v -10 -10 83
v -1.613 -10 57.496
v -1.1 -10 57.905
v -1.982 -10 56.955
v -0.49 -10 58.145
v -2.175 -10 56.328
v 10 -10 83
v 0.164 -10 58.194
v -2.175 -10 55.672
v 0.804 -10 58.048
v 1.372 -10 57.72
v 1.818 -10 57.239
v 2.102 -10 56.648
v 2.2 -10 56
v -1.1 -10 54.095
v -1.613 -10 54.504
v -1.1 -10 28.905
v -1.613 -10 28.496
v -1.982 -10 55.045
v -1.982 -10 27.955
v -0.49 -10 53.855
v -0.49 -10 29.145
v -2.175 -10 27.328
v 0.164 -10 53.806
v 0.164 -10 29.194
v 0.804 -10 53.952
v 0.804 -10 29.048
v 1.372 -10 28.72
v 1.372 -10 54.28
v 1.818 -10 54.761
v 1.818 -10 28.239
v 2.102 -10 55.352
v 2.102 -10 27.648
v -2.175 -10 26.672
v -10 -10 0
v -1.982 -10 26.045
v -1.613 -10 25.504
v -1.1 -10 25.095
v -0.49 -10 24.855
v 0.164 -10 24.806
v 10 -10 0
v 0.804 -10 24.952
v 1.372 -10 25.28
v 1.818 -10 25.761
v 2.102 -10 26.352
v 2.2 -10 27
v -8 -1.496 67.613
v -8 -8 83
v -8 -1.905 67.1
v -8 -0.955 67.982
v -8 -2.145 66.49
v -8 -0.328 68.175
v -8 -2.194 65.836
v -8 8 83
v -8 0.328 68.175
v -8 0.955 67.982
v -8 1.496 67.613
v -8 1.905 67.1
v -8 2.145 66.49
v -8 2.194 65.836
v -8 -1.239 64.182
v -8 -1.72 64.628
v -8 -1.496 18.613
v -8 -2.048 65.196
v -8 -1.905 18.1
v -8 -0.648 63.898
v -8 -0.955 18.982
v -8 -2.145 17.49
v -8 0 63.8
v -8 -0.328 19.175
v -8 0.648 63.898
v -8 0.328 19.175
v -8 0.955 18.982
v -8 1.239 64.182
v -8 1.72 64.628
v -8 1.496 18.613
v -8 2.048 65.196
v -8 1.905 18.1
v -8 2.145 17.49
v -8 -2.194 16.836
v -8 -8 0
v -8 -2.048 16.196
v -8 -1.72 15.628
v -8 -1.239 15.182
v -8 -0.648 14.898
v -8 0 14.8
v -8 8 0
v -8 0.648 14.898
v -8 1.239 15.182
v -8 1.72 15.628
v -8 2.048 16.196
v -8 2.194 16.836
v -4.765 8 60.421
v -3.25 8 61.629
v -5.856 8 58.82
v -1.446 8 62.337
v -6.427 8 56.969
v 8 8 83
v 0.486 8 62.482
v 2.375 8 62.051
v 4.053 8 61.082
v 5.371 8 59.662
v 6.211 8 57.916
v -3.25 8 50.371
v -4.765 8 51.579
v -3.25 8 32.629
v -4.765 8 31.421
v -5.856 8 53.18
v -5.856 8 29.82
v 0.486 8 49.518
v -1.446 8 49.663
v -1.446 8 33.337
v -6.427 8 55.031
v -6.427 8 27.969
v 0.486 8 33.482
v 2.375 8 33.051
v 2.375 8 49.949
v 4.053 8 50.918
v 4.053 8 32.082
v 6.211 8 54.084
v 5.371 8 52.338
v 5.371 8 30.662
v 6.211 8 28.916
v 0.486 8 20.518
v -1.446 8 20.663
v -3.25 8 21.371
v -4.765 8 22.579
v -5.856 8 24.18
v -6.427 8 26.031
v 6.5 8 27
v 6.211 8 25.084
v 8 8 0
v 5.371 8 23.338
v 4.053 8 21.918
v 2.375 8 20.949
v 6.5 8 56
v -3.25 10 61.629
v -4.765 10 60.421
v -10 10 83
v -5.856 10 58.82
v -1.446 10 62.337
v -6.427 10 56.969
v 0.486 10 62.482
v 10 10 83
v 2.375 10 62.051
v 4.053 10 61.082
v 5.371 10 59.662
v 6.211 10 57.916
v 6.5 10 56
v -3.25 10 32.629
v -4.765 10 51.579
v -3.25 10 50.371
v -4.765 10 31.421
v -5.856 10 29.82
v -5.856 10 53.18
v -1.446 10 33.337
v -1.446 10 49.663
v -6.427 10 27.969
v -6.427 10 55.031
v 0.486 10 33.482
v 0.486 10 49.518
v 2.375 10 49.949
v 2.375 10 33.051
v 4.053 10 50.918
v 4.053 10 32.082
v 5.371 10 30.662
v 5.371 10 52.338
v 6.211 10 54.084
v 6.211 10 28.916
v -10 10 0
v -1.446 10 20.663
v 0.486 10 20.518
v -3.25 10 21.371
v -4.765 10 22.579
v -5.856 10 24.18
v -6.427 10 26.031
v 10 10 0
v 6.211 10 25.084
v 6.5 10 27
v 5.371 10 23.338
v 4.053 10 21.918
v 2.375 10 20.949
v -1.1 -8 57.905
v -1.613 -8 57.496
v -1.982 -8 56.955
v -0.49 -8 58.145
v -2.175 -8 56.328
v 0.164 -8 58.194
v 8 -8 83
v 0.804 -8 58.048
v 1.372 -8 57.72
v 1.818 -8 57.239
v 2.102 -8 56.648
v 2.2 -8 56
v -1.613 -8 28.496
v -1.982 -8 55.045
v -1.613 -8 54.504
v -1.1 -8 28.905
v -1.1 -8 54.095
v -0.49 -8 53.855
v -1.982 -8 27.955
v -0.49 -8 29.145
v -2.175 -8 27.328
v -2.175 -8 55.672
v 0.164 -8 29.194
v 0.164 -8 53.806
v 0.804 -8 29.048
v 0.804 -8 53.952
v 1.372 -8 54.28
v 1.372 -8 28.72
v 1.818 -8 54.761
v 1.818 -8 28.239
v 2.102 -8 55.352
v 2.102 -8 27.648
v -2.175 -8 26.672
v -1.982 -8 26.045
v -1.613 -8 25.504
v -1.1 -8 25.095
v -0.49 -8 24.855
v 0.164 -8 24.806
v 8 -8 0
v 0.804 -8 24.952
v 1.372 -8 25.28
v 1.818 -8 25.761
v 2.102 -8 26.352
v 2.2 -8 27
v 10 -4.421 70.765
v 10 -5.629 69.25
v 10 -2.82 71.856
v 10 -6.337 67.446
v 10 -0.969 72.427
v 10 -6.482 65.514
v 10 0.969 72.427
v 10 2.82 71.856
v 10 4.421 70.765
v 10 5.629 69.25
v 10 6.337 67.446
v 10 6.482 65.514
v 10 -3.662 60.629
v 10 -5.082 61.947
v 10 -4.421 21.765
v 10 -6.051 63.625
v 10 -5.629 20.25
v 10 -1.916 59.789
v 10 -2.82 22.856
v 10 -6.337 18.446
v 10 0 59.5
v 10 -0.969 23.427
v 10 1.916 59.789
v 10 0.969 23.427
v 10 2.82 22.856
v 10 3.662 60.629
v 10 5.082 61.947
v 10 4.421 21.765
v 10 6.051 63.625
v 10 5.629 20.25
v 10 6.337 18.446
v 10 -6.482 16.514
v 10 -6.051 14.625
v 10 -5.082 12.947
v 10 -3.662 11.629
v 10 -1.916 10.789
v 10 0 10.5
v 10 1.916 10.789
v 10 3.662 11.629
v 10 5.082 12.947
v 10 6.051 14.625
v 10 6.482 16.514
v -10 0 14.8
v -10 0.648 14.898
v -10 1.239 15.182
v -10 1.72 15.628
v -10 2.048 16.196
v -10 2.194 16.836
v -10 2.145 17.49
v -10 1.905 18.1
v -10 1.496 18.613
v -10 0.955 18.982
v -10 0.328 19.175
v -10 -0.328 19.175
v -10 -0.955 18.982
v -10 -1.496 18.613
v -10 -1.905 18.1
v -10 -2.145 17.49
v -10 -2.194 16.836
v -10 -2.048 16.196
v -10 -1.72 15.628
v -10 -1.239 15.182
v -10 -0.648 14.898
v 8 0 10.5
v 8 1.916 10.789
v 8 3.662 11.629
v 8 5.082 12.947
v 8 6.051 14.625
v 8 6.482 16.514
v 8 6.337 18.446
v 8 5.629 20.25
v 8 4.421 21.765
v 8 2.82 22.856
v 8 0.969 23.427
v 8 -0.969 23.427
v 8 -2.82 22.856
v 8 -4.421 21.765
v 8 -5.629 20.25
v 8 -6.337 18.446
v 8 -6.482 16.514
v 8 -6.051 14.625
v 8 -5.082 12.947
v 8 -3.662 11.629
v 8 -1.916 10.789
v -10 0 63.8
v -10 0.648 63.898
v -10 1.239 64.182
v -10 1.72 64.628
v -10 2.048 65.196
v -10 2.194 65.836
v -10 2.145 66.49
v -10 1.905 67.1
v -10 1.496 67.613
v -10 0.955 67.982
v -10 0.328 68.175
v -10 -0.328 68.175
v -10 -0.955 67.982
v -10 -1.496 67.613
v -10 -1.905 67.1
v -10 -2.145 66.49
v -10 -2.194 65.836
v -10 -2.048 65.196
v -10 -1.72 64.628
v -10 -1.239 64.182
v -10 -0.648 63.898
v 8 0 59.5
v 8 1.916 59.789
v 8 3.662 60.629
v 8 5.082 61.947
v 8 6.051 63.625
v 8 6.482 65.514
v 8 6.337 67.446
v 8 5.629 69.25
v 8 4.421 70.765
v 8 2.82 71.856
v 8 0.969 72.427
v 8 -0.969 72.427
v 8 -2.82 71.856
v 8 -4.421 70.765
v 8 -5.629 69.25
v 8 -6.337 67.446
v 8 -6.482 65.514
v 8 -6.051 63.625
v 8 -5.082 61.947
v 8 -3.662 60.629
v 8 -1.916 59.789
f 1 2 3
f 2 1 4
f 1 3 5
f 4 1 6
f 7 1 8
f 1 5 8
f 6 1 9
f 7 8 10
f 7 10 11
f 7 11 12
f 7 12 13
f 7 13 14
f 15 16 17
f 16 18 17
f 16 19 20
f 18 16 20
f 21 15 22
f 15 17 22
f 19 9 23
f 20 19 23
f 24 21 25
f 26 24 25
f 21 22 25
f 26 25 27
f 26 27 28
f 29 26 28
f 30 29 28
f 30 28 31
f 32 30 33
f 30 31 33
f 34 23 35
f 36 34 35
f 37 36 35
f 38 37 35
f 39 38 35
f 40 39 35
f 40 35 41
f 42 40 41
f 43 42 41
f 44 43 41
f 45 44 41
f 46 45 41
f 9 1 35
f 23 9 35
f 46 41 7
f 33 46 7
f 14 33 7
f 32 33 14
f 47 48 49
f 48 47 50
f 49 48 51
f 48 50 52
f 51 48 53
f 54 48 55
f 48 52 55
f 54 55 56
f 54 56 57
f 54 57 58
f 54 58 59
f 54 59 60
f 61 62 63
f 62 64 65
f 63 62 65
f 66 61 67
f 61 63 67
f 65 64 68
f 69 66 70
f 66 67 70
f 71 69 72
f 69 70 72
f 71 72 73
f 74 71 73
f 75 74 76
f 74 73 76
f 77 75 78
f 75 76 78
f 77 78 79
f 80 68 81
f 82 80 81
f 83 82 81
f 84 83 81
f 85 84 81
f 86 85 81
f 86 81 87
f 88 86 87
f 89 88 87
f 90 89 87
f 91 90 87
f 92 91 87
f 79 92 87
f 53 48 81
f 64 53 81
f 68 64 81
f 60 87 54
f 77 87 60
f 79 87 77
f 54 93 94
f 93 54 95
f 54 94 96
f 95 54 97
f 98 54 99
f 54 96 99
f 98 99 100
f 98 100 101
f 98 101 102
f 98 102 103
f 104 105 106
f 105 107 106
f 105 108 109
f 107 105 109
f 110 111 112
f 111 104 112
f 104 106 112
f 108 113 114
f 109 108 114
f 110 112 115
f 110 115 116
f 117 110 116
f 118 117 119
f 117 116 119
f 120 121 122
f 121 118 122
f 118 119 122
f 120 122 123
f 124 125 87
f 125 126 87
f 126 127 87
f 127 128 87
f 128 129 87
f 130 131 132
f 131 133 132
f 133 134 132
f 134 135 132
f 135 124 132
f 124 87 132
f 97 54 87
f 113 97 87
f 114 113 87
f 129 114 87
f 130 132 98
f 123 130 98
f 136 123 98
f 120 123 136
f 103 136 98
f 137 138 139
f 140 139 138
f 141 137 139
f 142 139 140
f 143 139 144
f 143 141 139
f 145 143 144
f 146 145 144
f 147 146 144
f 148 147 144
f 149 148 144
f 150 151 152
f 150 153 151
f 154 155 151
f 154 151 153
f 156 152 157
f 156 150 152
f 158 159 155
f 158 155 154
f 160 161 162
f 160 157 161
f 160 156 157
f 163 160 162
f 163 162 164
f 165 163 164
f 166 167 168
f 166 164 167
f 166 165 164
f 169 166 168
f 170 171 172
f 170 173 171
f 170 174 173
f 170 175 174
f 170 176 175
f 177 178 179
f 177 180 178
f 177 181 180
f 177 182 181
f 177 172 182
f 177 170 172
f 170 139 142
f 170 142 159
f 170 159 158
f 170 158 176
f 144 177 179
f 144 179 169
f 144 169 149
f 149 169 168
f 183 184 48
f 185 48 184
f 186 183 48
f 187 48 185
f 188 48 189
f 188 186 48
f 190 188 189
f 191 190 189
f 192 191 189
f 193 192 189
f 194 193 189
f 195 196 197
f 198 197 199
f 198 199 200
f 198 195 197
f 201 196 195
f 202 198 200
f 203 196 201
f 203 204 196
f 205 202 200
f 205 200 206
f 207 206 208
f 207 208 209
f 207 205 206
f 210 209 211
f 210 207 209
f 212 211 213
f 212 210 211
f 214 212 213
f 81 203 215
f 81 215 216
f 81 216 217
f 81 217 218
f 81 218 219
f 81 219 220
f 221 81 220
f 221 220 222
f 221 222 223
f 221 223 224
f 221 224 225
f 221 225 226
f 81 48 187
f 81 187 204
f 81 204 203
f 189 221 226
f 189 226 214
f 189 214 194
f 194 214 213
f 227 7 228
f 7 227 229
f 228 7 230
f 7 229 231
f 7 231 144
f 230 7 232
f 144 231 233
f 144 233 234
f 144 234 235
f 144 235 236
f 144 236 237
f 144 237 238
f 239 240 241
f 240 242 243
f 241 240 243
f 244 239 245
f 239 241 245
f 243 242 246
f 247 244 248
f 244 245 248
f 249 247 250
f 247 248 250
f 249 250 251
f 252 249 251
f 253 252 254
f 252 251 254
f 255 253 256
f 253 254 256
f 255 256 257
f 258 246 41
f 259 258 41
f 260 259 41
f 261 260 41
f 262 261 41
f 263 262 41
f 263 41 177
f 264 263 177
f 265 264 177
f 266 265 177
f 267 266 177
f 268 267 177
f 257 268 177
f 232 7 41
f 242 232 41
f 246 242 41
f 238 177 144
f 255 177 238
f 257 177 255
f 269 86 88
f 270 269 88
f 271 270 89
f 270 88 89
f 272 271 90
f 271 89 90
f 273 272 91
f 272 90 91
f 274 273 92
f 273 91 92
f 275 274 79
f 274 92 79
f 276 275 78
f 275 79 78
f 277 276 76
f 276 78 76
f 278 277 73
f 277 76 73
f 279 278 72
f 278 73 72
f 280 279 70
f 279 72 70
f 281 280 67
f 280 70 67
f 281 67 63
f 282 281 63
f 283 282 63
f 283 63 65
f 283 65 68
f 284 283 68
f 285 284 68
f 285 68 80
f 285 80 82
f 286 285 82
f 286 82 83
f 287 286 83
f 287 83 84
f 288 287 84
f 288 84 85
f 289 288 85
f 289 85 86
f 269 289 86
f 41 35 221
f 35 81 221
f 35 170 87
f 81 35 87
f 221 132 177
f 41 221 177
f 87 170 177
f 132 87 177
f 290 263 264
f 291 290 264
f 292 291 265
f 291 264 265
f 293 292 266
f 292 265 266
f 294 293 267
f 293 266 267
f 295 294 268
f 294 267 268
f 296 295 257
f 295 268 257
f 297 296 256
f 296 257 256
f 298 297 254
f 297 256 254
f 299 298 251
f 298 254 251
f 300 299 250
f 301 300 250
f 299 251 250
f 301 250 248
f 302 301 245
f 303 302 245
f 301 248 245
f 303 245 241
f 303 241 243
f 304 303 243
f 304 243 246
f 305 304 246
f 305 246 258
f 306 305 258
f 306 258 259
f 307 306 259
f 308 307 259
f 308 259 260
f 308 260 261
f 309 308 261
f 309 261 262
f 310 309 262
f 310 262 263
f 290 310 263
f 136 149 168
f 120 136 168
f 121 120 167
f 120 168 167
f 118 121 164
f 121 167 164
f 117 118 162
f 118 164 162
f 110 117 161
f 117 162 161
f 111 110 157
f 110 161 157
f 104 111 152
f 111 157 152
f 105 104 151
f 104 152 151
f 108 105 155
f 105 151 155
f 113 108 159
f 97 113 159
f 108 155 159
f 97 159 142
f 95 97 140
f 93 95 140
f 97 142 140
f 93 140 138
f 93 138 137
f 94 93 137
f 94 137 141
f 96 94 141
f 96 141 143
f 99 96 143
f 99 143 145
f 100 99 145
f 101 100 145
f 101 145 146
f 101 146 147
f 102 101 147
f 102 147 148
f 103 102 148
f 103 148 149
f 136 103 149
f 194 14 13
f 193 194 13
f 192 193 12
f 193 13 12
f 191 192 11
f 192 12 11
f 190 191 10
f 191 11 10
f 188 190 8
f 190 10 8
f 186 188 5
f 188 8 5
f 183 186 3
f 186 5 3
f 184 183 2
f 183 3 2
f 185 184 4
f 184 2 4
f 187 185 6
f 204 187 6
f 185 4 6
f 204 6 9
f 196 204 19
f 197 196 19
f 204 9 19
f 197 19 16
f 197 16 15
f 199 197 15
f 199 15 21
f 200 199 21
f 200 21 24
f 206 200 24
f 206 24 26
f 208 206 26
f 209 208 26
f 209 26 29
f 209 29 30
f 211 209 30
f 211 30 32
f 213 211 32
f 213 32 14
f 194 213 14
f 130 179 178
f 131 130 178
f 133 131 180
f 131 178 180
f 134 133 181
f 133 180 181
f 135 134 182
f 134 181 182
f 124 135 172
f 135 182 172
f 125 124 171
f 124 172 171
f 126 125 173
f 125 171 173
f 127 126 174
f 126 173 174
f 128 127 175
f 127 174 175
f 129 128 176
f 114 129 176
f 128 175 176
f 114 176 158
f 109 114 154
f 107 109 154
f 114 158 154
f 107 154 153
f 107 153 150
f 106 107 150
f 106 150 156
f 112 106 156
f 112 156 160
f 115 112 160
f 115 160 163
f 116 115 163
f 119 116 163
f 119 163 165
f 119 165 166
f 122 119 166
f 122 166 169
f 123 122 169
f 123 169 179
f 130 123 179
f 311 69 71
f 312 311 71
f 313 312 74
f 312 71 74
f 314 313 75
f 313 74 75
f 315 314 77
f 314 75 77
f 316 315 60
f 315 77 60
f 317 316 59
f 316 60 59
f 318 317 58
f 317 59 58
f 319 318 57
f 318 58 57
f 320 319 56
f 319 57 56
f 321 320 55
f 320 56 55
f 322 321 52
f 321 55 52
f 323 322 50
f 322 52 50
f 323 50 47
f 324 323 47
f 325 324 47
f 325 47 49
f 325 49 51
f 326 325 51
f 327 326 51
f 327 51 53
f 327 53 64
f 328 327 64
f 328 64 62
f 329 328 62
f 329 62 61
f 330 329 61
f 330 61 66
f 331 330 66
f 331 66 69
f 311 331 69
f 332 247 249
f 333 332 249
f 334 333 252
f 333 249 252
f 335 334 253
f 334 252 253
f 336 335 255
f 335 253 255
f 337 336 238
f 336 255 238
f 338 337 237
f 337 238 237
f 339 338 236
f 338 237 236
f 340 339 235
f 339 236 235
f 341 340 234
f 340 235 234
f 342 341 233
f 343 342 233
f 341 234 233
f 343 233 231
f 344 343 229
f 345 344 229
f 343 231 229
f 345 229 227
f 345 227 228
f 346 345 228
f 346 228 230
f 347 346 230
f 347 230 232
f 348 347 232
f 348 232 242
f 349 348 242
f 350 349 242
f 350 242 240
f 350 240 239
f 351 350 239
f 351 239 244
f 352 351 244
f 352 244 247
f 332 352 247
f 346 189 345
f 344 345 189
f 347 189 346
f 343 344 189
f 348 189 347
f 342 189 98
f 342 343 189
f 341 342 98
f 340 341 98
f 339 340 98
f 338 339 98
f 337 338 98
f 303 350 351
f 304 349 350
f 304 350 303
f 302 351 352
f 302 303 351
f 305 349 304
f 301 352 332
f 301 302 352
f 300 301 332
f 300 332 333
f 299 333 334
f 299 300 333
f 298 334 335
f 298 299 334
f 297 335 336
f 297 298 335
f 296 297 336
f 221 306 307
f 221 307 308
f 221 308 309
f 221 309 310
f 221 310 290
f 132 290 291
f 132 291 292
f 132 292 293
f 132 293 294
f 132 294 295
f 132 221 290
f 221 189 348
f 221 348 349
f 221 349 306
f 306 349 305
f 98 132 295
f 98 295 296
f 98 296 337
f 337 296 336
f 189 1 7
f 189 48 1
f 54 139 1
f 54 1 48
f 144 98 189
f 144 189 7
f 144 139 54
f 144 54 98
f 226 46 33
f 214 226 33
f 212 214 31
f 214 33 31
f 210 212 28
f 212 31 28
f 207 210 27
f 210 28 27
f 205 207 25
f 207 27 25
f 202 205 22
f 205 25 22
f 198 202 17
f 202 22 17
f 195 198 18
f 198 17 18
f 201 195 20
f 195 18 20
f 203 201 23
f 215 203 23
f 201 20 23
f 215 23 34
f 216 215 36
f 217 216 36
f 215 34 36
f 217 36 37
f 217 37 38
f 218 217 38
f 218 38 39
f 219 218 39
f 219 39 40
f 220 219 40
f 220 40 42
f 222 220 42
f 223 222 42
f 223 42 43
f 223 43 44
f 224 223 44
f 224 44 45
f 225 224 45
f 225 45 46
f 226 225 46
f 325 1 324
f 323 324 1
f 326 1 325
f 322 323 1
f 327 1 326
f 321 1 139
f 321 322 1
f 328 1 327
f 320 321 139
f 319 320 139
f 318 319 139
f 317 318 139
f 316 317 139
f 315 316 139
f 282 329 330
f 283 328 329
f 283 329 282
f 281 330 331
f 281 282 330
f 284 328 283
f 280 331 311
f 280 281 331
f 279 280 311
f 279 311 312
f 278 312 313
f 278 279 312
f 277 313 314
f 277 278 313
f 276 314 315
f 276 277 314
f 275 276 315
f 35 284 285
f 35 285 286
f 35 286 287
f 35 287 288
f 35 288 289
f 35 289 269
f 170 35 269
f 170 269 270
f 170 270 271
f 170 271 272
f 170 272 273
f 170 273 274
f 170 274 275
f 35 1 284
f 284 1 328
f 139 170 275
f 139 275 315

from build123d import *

# Parameters (mm, degrees)
SKETCH_1_W               = 20
SKETCH_1_H               = 20
SKETCH_1_W_2             = 16
SKETCH_1_H_2             = 16
EXTRUDE_1_DEPTH          = 83
SKETCH_2_R               = 2.2
CUT_EXTRUDE_1_DEPTH      = 83
SKETCH_3_R               = 6.5
CUT_EXTRUDE_2_DEPTH      = 3
SKETCH_4_R               = 2.2
CUT_EXTRUDE_3_DEPTH      = 1
CUT_EXTRUDE_3_DEPTH_BACK = 21
SKETCH_5_R               = 6.5
CUT_EXTRUDE_4_DEPTH      = 3


with BuildPart() as part:
    # ｽｹｯﾁ1 → ﾎﾞｽ - 押し出し1 (new body)
    with BuildSketch(Plane.XY):
        Rectangle(SKETCH_1_W, SKETCH_1_H)
        Rectangle(SKETCH_1_W_2, SKETCH_1_H_2, mode=Mode.SUBTRACT)
    extrude(amount=EXTRUDE_1_DEPTH)

    # ｽｹｯﾁ2 → ｶｯﾄ - 押し出し1 (cut)
    with BuildSketch(Plane(origin=(10, 0, 0), x_dir=(0, 0, -1), z_dir=(1, 0, 0))):
        with Locations((-66, 0)):
            Circle(SKETCH_2_R)
        with Locations((-17, 0)):
            Circle(SKETCH_2_R)
    extrude(amount=-CUT_EXTRUDE_1_DEPTH, mode=Mode.SUBTRACT)

    # ｽｹｯﾁ3 → ｶｯﾄ - 押し出し2 (cut)
    with BuildSketch(Plane(origin=(10, 0, 0), x_dir=(0, 0, -1), z_dir=(1, 0, 0))):
        with Locations((-66, 0)):
            Circle(SKETCH_3_R)
        with Locations((-17, 0)):
            Circle(SKETCH_3_R)
    extrude(amount=-CUT_EXTRUDE_2_DEPTH, mode=Mode.SUBTRACT)

    # ｽｹｯﾁ4 → ｶｯﾄ - 押し出し3 (cut, two sides)
    with BuildSketch(Plane.XZ.offset(10)) as cut_extrude_3_sk:
        with Locations((0, 56)):
            Circle(SKETCH_4_R)
        with Locations((0, 27)):
            Circle(SKETCH_4_R)
    extrude(amount=CUT_EXTRUDE_3_DEPTH, mode=Mode.SUBTRACT)
    extrude(cut_extrude_3_sk.sketch, amount=-CUT_EXTRUDE_3_DEPTH_BACK, mode=Mode.SUBTRACT)

    # ｽｹｯﾁ5 → ｶｯﾄ - 押し出し4 (cut)
    with BuildSketch(Plane(origin=(0, 10, 0), x_dir=(1, 0, 0), z_dir=(0, 1, 0))):
        with Locations((0, -56)):
            Circle(SKETCH_5_R)
        with Locations((0, -27)):
            Circle(SKETCH_5_R)
    extrude(amount=-CUT_EXTRUDE_4_DEPTH, mode=Mode.SUBTRACT)


solid = part.part
